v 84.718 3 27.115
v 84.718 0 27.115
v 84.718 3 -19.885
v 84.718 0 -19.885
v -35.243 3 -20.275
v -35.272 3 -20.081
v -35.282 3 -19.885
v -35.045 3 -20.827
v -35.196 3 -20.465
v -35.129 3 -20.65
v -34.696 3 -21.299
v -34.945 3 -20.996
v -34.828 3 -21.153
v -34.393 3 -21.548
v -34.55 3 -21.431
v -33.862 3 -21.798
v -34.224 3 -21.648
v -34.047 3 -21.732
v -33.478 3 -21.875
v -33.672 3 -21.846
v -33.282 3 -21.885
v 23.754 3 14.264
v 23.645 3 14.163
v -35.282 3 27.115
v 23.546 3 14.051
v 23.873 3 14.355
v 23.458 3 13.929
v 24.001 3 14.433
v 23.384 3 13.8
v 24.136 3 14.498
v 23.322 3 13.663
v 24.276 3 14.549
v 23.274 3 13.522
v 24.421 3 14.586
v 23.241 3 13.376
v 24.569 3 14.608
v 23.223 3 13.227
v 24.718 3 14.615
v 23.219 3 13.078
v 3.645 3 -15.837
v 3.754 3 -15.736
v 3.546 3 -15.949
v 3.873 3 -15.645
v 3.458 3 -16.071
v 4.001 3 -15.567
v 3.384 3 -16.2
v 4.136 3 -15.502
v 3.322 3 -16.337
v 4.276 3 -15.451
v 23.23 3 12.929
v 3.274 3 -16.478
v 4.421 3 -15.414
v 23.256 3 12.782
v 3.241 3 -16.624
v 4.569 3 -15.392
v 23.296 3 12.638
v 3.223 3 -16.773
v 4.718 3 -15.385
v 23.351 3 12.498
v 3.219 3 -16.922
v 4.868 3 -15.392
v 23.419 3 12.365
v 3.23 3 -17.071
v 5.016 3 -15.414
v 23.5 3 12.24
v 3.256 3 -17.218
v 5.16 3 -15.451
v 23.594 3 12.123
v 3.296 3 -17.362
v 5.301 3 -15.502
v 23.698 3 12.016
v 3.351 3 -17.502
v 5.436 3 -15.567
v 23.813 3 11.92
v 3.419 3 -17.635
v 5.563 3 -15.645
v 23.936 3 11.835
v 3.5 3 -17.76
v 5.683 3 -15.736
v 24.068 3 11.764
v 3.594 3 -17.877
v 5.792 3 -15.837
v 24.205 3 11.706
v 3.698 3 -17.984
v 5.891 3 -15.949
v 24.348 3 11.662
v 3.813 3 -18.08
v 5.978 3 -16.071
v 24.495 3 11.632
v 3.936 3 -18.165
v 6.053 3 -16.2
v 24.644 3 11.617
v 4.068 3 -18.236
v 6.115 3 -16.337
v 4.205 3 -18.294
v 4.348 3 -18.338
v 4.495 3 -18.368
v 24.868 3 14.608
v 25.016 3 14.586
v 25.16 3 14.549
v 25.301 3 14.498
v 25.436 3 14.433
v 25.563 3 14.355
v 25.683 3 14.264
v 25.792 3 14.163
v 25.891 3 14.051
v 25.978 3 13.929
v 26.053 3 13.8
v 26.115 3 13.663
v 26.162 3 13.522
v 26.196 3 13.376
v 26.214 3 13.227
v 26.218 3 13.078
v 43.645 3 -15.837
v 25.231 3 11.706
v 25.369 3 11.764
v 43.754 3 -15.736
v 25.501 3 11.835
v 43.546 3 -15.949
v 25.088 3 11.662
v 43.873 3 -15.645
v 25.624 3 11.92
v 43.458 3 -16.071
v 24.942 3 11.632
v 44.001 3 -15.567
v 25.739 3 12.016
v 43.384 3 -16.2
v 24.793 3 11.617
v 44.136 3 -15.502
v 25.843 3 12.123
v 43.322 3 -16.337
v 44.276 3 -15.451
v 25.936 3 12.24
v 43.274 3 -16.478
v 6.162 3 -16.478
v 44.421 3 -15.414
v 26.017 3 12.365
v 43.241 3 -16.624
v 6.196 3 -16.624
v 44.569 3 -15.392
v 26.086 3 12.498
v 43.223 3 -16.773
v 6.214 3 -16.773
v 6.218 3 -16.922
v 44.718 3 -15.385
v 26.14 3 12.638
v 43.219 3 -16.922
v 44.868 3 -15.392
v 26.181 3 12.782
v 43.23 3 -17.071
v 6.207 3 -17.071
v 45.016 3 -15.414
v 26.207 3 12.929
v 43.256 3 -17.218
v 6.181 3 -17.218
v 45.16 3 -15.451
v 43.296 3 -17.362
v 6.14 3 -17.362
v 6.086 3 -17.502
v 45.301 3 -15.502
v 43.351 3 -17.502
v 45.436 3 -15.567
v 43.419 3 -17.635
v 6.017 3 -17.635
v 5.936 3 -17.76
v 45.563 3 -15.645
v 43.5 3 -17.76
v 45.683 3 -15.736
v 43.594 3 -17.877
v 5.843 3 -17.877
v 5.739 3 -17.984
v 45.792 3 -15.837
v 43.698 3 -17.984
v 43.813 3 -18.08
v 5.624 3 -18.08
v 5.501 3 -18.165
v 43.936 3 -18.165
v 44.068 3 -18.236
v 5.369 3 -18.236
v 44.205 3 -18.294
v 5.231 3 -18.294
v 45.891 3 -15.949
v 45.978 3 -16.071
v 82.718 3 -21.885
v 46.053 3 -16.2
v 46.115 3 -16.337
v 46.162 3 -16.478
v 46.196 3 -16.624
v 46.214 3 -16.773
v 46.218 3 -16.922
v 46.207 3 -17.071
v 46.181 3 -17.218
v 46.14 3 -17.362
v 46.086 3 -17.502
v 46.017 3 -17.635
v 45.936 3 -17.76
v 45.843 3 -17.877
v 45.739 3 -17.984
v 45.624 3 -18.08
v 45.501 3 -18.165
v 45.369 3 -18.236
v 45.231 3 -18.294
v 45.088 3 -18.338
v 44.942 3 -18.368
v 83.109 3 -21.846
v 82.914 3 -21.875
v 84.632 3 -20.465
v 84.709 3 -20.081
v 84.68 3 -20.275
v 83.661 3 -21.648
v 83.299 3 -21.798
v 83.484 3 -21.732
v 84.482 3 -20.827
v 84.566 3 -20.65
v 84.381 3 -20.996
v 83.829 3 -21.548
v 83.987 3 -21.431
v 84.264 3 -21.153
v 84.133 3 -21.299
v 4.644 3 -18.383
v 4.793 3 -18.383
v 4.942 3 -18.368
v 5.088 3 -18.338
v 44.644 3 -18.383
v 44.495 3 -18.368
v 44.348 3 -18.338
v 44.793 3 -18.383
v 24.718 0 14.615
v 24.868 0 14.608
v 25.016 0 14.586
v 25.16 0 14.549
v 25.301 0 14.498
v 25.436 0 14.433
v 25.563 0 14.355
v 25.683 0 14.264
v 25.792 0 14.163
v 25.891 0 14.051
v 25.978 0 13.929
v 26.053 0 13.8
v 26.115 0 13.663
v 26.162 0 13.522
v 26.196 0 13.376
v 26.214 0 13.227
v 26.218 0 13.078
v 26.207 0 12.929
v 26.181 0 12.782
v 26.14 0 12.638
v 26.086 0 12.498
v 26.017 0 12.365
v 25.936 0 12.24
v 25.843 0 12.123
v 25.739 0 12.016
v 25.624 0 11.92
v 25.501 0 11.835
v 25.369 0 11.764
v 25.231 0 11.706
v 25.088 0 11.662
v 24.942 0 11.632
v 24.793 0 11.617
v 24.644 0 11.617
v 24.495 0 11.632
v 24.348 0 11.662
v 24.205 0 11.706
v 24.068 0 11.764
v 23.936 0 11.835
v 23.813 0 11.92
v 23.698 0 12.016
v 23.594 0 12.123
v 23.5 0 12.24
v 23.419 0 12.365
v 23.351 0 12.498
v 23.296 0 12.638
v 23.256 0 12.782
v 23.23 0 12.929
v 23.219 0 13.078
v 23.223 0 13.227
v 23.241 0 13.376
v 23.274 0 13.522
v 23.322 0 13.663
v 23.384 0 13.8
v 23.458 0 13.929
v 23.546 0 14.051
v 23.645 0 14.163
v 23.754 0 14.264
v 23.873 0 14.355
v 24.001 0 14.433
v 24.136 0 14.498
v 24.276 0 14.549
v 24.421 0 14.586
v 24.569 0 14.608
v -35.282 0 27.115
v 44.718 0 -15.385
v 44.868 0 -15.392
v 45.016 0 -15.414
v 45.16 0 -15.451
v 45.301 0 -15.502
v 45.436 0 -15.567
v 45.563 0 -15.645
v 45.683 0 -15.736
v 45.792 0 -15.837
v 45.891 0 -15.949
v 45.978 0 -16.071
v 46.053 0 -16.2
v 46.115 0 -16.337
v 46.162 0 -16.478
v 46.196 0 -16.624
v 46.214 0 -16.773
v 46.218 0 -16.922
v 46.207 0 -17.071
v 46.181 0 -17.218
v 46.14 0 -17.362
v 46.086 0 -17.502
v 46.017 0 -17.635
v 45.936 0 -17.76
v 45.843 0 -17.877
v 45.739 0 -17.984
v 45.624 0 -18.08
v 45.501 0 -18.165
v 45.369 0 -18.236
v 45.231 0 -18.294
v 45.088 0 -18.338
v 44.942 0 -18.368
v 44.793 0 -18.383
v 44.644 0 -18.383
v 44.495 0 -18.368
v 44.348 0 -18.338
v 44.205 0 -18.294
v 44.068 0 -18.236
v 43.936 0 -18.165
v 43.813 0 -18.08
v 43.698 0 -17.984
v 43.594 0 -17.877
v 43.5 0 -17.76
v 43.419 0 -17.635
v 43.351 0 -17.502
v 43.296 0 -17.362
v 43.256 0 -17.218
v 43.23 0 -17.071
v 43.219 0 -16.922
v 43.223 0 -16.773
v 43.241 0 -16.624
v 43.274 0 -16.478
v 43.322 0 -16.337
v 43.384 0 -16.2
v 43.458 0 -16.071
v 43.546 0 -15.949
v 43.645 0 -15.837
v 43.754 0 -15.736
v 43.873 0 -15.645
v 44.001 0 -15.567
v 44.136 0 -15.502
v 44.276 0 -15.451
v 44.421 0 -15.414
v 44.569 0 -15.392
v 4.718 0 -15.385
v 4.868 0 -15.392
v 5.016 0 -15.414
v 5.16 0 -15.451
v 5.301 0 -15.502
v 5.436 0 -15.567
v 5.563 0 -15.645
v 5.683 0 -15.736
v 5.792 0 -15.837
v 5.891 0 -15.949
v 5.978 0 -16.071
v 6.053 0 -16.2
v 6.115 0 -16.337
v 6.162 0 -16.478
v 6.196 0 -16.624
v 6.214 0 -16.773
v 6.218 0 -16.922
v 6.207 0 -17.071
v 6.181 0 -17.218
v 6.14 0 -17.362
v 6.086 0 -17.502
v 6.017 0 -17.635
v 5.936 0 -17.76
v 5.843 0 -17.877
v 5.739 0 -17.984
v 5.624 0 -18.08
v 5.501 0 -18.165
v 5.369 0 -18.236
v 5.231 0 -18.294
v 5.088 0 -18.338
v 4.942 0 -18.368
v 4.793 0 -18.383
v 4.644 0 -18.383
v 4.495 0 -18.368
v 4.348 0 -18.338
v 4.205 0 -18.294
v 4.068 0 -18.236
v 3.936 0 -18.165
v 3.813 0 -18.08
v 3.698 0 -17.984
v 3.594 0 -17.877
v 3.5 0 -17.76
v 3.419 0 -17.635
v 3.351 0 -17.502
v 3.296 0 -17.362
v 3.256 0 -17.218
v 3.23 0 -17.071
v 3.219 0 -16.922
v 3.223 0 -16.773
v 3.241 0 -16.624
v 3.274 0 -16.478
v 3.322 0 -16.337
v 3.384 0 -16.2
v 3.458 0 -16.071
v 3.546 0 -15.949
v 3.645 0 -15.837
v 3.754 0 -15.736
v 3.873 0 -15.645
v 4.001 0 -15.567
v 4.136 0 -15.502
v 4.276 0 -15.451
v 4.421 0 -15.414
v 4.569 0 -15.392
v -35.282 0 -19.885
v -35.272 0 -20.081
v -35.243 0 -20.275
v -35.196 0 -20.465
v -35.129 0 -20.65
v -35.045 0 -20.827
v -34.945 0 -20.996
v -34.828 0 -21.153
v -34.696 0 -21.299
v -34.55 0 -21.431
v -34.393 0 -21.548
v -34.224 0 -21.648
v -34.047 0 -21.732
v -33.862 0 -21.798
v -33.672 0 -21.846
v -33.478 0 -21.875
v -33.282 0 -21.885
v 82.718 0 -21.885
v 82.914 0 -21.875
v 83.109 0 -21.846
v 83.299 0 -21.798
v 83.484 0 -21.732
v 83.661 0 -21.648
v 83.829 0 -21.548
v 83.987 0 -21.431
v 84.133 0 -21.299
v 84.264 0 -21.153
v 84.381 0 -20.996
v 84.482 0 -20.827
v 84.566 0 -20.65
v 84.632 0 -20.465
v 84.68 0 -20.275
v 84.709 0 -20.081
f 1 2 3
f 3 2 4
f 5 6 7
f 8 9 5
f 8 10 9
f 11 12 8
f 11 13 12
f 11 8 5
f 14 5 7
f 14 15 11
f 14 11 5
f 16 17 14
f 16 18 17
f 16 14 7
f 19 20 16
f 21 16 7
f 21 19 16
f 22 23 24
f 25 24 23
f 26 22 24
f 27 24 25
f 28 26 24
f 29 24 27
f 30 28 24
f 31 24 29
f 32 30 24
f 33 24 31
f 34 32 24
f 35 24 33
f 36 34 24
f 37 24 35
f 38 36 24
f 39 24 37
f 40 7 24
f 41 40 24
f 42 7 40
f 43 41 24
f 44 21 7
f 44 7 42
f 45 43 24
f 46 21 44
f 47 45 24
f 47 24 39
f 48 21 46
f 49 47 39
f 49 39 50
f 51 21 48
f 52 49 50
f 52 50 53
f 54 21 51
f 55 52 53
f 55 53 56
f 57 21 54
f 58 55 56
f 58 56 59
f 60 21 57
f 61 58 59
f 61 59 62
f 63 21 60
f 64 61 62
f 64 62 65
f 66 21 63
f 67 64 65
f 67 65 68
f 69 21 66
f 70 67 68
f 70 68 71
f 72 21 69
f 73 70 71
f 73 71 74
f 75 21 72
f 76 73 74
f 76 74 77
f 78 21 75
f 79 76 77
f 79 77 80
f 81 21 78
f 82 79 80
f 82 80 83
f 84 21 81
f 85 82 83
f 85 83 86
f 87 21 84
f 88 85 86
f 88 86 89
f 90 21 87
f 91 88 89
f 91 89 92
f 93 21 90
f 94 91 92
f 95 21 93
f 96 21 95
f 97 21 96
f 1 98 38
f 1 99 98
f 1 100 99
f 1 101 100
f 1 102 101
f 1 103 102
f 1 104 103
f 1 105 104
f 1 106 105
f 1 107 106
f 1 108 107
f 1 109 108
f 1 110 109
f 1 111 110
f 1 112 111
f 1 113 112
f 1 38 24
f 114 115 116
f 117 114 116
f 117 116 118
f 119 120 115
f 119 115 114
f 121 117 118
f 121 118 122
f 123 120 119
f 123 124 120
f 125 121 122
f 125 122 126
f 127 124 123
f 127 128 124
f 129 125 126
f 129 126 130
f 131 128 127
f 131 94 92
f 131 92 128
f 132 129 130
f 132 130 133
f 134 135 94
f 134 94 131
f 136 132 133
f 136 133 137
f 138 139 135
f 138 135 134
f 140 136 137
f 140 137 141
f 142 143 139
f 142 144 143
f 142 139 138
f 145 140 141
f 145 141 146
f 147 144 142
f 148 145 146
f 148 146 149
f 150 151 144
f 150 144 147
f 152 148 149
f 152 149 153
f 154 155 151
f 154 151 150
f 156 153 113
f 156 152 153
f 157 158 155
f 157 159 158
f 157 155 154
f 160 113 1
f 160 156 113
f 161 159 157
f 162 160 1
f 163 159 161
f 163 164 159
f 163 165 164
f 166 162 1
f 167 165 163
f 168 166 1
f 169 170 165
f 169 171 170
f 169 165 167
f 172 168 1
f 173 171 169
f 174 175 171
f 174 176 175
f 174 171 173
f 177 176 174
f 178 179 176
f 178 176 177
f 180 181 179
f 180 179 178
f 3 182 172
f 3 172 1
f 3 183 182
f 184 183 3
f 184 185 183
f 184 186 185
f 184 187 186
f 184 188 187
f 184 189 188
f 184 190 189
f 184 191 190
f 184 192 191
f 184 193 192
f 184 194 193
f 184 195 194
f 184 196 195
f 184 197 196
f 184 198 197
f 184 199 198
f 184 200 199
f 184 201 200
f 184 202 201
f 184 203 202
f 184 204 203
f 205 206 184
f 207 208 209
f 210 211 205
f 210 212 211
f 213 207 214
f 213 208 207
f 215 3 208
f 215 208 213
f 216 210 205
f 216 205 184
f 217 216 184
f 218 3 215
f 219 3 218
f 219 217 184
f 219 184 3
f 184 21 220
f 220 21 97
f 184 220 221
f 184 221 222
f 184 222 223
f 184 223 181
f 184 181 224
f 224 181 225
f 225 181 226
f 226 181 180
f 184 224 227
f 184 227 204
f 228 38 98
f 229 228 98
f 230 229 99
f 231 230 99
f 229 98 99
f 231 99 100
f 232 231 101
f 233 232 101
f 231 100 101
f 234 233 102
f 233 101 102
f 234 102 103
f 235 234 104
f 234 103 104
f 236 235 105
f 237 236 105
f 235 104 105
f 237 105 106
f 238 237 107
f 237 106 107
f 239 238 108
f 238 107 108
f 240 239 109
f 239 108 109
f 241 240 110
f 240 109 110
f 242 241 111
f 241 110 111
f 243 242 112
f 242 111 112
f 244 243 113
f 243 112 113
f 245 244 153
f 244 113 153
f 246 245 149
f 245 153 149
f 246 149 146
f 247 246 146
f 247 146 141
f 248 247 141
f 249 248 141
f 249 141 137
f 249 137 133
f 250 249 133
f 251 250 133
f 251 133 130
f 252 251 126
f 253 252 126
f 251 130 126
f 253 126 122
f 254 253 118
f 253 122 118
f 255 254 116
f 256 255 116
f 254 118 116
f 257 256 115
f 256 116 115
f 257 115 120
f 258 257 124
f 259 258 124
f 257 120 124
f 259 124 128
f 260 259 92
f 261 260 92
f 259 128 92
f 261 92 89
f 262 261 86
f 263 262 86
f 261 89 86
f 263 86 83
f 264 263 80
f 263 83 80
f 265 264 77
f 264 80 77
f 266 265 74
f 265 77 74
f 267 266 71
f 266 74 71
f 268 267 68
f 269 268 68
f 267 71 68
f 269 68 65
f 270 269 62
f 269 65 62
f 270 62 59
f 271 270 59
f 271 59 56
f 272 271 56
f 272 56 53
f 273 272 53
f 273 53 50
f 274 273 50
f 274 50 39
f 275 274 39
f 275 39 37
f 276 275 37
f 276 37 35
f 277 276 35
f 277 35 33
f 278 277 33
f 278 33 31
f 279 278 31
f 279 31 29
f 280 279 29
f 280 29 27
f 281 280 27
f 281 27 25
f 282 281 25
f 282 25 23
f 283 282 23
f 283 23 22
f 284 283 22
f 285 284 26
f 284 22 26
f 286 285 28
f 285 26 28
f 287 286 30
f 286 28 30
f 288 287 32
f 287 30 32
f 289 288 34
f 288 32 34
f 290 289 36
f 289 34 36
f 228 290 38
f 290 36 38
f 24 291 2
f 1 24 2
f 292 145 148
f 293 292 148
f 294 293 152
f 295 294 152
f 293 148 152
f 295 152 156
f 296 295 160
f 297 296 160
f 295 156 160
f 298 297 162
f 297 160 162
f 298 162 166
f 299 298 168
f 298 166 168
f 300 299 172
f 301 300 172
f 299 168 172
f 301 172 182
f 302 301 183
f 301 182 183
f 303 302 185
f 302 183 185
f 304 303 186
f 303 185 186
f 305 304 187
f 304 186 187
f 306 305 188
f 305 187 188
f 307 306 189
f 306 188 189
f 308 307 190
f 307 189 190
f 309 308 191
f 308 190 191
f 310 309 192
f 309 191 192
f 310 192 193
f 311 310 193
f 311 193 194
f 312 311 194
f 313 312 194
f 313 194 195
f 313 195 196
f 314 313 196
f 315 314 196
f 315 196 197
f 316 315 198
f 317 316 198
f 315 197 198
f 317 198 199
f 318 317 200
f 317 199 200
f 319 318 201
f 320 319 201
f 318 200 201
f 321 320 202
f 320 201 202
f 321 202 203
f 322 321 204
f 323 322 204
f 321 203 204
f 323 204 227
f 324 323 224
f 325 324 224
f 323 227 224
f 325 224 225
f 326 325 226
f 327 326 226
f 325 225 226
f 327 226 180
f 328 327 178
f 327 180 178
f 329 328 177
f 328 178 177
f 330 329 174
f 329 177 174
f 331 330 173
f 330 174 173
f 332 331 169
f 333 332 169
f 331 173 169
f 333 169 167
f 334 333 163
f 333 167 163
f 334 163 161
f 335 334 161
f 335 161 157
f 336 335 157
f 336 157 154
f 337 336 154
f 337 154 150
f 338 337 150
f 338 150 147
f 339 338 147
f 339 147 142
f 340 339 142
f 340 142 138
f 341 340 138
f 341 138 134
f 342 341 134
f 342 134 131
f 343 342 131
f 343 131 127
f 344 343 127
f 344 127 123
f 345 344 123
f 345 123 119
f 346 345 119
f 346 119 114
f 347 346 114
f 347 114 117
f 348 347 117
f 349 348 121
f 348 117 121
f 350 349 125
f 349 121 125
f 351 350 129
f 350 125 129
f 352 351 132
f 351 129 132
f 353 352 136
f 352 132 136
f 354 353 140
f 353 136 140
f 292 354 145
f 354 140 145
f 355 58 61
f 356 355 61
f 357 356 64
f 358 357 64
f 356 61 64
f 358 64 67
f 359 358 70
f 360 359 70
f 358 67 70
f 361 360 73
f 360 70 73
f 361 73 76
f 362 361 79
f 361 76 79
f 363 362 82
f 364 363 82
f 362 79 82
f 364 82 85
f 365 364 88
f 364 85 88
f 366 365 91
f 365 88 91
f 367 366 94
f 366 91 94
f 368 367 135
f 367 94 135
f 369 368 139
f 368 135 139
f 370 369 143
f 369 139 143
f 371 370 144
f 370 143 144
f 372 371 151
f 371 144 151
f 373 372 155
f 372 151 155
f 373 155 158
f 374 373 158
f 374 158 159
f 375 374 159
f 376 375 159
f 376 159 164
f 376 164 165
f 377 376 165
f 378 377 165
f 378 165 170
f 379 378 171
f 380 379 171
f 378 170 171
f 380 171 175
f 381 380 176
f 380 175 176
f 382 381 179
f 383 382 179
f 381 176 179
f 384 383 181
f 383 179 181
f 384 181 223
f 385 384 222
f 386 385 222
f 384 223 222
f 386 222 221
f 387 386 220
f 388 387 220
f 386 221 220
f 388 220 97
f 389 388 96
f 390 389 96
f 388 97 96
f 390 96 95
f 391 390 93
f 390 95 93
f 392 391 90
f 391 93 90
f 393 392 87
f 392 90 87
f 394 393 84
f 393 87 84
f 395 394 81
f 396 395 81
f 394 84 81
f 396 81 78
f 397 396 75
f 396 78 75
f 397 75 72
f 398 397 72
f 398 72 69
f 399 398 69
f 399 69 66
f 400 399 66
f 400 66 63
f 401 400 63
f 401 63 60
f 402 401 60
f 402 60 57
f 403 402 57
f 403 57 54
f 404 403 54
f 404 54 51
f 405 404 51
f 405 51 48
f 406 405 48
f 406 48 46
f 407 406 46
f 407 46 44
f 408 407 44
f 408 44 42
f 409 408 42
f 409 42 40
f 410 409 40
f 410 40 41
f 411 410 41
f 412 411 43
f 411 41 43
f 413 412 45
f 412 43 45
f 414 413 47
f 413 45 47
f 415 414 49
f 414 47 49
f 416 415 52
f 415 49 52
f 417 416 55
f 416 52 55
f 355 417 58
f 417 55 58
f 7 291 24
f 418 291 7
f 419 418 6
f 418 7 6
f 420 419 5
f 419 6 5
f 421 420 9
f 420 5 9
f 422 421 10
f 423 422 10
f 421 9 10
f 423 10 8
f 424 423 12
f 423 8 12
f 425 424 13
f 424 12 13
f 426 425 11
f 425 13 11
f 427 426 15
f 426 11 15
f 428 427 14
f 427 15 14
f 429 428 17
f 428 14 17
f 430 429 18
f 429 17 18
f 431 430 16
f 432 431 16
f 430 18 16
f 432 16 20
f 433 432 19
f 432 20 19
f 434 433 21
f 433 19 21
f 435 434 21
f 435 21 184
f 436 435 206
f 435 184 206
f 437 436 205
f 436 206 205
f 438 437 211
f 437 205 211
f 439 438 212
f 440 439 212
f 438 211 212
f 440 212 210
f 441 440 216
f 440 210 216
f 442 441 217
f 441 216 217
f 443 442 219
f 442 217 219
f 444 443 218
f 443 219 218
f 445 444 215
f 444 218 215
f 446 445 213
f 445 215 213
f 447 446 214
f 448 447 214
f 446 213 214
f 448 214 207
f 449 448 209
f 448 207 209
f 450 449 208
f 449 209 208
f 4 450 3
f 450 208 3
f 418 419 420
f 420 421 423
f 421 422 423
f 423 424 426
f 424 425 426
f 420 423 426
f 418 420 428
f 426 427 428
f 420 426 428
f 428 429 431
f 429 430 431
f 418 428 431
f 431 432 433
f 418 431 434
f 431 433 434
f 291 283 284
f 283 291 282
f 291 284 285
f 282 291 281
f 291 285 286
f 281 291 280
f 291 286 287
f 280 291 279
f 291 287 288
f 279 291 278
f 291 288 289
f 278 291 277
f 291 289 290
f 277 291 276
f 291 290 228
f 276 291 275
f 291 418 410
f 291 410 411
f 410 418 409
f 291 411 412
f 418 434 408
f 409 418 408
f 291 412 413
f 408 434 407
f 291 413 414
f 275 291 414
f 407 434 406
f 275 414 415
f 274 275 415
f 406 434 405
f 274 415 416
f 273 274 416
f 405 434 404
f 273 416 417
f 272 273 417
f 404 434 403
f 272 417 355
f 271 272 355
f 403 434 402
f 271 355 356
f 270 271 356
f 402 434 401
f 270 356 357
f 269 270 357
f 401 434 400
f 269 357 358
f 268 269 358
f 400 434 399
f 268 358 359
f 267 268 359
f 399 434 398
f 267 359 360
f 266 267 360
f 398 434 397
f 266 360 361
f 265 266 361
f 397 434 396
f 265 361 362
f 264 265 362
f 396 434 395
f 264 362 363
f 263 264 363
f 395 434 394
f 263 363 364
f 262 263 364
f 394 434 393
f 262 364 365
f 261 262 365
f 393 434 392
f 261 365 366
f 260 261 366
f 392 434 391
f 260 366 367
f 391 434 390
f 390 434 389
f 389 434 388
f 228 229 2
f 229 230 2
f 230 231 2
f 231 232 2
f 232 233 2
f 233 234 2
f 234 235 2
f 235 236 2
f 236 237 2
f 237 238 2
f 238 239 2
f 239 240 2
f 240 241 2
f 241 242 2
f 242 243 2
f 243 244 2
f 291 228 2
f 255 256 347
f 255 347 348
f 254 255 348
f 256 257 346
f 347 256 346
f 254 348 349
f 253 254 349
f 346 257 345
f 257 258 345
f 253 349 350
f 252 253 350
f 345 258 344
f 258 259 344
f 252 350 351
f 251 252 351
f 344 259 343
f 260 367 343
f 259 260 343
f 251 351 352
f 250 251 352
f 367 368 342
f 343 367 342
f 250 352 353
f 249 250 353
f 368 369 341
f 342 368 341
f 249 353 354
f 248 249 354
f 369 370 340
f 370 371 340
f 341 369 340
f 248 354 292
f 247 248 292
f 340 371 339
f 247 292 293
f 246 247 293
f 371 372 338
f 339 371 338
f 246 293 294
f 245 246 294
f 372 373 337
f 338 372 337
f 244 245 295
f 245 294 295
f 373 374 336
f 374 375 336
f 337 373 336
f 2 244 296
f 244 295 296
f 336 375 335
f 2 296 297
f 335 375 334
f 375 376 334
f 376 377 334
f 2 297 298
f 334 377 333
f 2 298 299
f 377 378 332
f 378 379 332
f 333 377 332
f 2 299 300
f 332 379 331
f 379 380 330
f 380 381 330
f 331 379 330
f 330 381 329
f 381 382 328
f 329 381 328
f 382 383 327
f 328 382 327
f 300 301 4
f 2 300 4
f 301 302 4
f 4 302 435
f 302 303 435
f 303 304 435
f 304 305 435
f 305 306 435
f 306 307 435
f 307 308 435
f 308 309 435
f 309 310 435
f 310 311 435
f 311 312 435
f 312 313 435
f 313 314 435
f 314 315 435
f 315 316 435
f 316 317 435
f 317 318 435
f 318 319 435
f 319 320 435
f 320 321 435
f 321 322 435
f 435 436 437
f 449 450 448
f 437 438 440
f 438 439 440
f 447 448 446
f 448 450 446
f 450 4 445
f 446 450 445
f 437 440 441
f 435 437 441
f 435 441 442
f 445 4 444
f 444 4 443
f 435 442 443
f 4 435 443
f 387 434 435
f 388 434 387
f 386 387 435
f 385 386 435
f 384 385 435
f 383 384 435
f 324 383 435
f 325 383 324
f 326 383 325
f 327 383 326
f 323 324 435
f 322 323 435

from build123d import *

# Parameters (mm, degrees)
SKETCH_1_W          = 120
SKETCH_1_H          = 49
EXTRUDE_1_DEPTH     = 3
SKETCH_2_R          = 1.5
CUT_EXTRUDE_1_DEPTH = 3
FILLET_1_R          = 2


with BuildPart() as part:
    # 草图1 → 凸台-拉伸1 (new body)
    with BuildSketch(Plane(origin=(0, 0, 0), x_dir=(1, 0, 0), z_dir=(0, 1, 0))):
        with Locations((24.718351515, -2.615392567)):
            Rectangle(SKETCH_1_W, SKETCH_1_H)
    extrude(amount=EXTRUDE_1_DEPTH)

    # 草图2 → 切除-拉伸1 (cut)
    with BuildSketch(Plane(origin=(0, 3, 0), x_dir=(1, 0, 0), z_dir=(0, 1, 0))):
        with Locations(Location((4.718351515, 16.884607433, 0), (0, 0, 270))):
            Circle(SKETCH_2_R)
        with Locations(Location((44.718351515, 16.884607433, 0), (0, 0, 270))):
            Circle(SKETCH_2_R)
        with Locations(Location((24.718351515, -13.115392567, 0), (0, 0, 270))):
            Circle(SKETCH_2_R)
    extrude(amount=-CUT_EXTRUDE_1_DEPTH, mode=Mode.SUBTRACT)

    # 圆角1
    fillet_1_edges = [part.edges().sort_by_distance(p)[0] for p in [
        (-35.281648485, 1.5, -21.884607433),
        (84.718351515, 1.5, -21.884607433),
    ]]
    fillet(fillet_1_edges, radius=FILLET_1_R)


solid = part.part
